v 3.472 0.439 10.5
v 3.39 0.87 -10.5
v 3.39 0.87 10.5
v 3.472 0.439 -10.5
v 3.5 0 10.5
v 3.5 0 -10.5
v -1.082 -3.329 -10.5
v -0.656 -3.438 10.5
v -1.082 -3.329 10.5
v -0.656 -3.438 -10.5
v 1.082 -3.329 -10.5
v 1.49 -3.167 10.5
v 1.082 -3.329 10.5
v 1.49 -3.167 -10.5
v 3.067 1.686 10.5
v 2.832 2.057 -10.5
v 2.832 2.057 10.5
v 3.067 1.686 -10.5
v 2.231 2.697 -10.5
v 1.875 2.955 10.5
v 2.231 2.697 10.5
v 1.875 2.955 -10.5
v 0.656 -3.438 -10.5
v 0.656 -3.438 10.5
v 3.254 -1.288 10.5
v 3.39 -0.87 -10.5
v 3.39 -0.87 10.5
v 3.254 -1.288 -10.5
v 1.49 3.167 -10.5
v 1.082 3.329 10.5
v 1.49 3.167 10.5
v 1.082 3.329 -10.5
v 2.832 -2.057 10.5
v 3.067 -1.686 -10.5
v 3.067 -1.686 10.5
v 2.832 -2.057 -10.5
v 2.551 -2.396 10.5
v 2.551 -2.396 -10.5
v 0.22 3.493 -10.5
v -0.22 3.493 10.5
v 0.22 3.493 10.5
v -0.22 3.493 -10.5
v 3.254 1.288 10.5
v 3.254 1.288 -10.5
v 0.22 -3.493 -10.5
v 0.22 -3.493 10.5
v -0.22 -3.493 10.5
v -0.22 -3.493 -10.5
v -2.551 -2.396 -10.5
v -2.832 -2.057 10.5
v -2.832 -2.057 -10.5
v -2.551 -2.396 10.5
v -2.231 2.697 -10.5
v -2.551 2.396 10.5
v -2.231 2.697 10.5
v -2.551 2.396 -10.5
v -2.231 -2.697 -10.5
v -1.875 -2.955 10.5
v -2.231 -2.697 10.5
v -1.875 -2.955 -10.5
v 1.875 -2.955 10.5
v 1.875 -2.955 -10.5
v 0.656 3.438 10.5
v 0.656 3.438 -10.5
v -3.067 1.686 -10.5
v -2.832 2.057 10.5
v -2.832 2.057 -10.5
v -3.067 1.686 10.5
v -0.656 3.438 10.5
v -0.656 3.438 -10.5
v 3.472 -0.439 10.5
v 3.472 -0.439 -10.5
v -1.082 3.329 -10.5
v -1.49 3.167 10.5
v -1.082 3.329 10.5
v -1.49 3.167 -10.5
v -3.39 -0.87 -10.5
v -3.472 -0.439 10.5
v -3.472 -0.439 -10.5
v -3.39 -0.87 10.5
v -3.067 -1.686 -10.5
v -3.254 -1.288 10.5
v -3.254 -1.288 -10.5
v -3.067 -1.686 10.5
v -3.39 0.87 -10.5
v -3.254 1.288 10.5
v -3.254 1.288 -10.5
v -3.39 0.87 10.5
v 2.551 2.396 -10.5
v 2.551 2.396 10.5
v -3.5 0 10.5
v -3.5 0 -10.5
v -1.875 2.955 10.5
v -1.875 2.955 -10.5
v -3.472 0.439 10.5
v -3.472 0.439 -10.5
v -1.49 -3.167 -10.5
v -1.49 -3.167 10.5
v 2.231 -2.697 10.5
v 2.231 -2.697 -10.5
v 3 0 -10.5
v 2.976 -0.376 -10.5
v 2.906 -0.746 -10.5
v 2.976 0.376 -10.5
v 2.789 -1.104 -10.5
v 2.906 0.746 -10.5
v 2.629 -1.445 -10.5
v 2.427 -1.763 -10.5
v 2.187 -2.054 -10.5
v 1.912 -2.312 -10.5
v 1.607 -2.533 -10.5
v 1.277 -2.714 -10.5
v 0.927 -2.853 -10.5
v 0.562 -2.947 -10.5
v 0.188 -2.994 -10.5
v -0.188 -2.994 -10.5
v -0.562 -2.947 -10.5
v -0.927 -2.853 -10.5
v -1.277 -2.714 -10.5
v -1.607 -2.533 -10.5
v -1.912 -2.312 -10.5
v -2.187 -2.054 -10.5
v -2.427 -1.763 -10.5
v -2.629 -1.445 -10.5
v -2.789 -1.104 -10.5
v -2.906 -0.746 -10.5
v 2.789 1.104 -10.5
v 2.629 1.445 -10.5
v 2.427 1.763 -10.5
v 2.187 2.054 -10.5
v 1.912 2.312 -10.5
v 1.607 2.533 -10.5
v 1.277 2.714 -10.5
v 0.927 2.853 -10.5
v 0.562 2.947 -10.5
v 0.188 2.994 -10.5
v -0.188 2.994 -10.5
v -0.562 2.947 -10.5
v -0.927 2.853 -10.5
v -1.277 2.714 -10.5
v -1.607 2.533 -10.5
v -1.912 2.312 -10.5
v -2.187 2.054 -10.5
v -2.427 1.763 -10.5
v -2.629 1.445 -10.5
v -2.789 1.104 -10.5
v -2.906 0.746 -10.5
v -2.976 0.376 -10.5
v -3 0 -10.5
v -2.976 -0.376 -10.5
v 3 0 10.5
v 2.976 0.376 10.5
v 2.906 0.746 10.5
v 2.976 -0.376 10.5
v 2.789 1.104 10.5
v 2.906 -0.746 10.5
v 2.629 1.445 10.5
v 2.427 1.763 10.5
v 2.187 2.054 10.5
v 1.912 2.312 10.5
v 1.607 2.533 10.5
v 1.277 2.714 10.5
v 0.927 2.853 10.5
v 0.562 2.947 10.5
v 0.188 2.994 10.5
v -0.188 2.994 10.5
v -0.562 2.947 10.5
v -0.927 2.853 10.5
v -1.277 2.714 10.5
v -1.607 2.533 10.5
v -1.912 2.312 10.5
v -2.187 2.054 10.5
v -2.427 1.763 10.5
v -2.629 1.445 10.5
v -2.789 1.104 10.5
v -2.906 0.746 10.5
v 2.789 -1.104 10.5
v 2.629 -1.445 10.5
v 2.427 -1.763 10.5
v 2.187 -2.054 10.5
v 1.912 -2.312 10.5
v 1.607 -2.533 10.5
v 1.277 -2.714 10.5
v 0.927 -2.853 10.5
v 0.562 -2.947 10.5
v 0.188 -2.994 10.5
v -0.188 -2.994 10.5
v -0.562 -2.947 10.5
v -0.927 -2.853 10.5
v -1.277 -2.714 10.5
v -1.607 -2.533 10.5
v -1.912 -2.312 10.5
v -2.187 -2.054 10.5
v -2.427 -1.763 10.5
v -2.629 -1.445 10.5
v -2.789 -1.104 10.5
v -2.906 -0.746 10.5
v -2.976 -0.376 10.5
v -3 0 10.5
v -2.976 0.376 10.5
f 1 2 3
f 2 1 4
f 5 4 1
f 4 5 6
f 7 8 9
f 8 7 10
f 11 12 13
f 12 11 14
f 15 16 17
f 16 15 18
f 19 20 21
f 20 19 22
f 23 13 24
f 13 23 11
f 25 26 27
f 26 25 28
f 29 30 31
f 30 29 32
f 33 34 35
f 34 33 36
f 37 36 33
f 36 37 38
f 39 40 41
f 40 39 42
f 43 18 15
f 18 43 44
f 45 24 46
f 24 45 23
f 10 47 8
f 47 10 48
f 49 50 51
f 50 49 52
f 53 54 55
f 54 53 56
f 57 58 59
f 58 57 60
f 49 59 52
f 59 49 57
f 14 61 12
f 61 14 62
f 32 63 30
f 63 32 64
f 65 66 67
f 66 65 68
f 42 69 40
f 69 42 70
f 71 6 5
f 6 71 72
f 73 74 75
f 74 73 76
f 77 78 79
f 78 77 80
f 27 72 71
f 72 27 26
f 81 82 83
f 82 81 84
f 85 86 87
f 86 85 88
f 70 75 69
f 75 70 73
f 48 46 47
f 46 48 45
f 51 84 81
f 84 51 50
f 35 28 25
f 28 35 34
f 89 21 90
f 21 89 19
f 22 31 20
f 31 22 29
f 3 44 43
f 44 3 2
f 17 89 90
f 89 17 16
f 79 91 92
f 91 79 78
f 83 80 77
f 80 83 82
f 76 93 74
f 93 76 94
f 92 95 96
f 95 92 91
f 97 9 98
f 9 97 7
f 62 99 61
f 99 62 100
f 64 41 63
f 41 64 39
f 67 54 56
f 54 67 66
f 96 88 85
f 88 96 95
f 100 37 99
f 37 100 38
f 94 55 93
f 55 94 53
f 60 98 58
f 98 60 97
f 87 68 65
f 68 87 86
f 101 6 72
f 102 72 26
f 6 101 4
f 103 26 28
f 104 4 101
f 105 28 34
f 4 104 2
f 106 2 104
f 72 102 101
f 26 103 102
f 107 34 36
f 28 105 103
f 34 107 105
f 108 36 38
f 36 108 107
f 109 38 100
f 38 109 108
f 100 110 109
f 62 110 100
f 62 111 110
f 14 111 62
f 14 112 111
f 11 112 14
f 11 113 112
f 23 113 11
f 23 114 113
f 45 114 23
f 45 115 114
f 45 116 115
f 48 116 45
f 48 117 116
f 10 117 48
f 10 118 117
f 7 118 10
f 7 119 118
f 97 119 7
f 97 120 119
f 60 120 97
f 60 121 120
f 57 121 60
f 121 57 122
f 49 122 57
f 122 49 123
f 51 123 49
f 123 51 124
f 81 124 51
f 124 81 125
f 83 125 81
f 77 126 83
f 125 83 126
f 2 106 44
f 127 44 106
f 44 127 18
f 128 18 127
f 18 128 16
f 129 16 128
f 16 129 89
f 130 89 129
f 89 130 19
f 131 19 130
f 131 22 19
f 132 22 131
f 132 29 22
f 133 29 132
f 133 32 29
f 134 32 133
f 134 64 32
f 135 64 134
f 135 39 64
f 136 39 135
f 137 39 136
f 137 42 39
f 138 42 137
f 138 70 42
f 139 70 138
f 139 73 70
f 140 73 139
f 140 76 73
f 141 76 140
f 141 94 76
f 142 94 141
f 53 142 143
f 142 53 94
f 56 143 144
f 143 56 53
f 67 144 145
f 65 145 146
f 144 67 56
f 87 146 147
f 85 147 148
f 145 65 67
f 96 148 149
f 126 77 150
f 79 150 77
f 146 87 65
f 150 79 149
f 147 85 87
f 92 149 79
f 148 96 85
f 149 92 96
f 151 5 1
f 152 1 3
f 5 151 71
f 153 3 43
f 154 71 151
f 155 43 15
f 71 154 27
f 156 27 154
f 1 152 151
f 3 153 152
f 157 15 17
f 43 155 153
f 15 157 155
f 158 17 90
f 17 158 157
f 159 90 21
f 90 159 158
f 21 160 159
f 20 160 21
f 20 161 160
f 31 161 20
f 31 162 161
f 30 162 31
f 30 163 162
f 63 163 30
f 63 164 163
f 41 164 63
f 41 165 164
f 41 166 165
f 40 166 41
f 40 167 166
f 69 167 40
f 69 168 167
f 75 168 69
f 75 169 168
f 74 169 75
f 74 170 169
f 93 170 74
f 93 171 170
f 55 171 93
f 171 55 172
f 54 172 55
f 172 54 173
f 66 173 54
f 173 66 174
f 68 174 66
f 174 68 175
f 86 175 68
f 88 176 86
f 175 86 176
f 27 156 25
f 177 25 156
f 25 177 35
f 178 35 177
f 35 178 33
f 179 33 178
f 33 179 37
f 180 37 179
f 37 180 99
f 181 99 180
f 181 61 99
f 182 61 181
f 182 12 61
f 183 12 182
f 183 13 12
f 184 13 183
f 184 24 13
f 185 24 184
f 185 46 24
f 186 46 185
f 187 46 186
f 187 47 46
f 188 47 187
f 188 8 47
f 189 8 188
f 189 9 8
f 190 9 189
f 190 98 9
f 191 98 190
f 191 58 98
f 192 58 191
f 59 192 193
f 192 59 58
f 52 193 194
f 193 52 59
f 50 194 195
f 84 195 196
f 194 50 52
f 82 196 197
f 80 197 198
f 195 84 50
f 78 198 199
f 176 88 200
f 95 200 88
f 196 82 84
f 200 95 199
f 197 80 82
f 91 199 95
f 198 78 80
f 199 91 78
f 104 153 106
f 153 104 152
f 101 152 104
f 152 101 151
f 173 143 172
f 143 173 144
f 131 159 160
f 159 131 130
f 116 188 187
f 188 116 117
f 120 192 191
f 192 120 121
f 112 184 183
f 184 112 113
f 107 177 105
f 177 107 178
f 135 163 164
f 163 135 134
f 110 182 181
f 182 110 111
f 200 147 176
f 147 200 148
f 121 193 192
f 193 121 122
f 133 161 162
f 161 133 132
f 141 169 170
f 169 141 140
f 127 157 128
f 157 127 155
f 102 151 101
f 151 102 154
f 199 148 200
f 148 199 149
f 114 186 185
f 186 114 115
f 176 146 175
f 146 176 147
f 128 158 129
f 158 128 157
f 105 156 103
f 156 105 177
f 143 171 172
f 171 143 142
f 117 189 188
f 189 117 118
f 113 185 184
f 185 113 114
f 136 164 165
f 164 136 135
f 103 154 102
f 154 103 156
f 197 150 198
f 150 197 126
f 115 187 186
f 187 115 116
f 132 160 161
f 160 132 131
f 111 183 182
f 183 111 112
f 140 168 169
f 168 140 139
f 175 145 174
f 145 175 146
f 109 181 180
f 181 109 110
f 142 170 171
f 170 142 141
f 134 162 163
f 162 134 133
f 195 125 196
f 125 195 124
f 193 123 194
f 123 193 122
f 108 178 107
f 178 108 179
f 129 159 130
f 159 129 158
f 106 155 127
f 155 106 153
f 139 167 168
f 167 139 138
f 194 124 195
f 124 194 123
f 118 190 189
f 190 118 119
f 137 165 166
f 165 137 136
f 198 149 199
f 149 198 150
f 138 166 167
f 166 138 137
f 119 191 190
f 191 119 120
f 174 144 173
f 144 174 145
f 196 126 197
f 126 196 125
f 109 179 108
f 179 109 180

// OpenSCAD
$fn = 50;


difference() {
	union() {
		translate(v = [0, 0, -10.5000000000]) {
			cylinder(h = 21, r = 3.5000000000);
		}
	}
	union() {
		translate(v = [0, 0, -100.0000000000]) {
			cylinder(h = 200, r = 3.0000000000);
		}
	}
}
